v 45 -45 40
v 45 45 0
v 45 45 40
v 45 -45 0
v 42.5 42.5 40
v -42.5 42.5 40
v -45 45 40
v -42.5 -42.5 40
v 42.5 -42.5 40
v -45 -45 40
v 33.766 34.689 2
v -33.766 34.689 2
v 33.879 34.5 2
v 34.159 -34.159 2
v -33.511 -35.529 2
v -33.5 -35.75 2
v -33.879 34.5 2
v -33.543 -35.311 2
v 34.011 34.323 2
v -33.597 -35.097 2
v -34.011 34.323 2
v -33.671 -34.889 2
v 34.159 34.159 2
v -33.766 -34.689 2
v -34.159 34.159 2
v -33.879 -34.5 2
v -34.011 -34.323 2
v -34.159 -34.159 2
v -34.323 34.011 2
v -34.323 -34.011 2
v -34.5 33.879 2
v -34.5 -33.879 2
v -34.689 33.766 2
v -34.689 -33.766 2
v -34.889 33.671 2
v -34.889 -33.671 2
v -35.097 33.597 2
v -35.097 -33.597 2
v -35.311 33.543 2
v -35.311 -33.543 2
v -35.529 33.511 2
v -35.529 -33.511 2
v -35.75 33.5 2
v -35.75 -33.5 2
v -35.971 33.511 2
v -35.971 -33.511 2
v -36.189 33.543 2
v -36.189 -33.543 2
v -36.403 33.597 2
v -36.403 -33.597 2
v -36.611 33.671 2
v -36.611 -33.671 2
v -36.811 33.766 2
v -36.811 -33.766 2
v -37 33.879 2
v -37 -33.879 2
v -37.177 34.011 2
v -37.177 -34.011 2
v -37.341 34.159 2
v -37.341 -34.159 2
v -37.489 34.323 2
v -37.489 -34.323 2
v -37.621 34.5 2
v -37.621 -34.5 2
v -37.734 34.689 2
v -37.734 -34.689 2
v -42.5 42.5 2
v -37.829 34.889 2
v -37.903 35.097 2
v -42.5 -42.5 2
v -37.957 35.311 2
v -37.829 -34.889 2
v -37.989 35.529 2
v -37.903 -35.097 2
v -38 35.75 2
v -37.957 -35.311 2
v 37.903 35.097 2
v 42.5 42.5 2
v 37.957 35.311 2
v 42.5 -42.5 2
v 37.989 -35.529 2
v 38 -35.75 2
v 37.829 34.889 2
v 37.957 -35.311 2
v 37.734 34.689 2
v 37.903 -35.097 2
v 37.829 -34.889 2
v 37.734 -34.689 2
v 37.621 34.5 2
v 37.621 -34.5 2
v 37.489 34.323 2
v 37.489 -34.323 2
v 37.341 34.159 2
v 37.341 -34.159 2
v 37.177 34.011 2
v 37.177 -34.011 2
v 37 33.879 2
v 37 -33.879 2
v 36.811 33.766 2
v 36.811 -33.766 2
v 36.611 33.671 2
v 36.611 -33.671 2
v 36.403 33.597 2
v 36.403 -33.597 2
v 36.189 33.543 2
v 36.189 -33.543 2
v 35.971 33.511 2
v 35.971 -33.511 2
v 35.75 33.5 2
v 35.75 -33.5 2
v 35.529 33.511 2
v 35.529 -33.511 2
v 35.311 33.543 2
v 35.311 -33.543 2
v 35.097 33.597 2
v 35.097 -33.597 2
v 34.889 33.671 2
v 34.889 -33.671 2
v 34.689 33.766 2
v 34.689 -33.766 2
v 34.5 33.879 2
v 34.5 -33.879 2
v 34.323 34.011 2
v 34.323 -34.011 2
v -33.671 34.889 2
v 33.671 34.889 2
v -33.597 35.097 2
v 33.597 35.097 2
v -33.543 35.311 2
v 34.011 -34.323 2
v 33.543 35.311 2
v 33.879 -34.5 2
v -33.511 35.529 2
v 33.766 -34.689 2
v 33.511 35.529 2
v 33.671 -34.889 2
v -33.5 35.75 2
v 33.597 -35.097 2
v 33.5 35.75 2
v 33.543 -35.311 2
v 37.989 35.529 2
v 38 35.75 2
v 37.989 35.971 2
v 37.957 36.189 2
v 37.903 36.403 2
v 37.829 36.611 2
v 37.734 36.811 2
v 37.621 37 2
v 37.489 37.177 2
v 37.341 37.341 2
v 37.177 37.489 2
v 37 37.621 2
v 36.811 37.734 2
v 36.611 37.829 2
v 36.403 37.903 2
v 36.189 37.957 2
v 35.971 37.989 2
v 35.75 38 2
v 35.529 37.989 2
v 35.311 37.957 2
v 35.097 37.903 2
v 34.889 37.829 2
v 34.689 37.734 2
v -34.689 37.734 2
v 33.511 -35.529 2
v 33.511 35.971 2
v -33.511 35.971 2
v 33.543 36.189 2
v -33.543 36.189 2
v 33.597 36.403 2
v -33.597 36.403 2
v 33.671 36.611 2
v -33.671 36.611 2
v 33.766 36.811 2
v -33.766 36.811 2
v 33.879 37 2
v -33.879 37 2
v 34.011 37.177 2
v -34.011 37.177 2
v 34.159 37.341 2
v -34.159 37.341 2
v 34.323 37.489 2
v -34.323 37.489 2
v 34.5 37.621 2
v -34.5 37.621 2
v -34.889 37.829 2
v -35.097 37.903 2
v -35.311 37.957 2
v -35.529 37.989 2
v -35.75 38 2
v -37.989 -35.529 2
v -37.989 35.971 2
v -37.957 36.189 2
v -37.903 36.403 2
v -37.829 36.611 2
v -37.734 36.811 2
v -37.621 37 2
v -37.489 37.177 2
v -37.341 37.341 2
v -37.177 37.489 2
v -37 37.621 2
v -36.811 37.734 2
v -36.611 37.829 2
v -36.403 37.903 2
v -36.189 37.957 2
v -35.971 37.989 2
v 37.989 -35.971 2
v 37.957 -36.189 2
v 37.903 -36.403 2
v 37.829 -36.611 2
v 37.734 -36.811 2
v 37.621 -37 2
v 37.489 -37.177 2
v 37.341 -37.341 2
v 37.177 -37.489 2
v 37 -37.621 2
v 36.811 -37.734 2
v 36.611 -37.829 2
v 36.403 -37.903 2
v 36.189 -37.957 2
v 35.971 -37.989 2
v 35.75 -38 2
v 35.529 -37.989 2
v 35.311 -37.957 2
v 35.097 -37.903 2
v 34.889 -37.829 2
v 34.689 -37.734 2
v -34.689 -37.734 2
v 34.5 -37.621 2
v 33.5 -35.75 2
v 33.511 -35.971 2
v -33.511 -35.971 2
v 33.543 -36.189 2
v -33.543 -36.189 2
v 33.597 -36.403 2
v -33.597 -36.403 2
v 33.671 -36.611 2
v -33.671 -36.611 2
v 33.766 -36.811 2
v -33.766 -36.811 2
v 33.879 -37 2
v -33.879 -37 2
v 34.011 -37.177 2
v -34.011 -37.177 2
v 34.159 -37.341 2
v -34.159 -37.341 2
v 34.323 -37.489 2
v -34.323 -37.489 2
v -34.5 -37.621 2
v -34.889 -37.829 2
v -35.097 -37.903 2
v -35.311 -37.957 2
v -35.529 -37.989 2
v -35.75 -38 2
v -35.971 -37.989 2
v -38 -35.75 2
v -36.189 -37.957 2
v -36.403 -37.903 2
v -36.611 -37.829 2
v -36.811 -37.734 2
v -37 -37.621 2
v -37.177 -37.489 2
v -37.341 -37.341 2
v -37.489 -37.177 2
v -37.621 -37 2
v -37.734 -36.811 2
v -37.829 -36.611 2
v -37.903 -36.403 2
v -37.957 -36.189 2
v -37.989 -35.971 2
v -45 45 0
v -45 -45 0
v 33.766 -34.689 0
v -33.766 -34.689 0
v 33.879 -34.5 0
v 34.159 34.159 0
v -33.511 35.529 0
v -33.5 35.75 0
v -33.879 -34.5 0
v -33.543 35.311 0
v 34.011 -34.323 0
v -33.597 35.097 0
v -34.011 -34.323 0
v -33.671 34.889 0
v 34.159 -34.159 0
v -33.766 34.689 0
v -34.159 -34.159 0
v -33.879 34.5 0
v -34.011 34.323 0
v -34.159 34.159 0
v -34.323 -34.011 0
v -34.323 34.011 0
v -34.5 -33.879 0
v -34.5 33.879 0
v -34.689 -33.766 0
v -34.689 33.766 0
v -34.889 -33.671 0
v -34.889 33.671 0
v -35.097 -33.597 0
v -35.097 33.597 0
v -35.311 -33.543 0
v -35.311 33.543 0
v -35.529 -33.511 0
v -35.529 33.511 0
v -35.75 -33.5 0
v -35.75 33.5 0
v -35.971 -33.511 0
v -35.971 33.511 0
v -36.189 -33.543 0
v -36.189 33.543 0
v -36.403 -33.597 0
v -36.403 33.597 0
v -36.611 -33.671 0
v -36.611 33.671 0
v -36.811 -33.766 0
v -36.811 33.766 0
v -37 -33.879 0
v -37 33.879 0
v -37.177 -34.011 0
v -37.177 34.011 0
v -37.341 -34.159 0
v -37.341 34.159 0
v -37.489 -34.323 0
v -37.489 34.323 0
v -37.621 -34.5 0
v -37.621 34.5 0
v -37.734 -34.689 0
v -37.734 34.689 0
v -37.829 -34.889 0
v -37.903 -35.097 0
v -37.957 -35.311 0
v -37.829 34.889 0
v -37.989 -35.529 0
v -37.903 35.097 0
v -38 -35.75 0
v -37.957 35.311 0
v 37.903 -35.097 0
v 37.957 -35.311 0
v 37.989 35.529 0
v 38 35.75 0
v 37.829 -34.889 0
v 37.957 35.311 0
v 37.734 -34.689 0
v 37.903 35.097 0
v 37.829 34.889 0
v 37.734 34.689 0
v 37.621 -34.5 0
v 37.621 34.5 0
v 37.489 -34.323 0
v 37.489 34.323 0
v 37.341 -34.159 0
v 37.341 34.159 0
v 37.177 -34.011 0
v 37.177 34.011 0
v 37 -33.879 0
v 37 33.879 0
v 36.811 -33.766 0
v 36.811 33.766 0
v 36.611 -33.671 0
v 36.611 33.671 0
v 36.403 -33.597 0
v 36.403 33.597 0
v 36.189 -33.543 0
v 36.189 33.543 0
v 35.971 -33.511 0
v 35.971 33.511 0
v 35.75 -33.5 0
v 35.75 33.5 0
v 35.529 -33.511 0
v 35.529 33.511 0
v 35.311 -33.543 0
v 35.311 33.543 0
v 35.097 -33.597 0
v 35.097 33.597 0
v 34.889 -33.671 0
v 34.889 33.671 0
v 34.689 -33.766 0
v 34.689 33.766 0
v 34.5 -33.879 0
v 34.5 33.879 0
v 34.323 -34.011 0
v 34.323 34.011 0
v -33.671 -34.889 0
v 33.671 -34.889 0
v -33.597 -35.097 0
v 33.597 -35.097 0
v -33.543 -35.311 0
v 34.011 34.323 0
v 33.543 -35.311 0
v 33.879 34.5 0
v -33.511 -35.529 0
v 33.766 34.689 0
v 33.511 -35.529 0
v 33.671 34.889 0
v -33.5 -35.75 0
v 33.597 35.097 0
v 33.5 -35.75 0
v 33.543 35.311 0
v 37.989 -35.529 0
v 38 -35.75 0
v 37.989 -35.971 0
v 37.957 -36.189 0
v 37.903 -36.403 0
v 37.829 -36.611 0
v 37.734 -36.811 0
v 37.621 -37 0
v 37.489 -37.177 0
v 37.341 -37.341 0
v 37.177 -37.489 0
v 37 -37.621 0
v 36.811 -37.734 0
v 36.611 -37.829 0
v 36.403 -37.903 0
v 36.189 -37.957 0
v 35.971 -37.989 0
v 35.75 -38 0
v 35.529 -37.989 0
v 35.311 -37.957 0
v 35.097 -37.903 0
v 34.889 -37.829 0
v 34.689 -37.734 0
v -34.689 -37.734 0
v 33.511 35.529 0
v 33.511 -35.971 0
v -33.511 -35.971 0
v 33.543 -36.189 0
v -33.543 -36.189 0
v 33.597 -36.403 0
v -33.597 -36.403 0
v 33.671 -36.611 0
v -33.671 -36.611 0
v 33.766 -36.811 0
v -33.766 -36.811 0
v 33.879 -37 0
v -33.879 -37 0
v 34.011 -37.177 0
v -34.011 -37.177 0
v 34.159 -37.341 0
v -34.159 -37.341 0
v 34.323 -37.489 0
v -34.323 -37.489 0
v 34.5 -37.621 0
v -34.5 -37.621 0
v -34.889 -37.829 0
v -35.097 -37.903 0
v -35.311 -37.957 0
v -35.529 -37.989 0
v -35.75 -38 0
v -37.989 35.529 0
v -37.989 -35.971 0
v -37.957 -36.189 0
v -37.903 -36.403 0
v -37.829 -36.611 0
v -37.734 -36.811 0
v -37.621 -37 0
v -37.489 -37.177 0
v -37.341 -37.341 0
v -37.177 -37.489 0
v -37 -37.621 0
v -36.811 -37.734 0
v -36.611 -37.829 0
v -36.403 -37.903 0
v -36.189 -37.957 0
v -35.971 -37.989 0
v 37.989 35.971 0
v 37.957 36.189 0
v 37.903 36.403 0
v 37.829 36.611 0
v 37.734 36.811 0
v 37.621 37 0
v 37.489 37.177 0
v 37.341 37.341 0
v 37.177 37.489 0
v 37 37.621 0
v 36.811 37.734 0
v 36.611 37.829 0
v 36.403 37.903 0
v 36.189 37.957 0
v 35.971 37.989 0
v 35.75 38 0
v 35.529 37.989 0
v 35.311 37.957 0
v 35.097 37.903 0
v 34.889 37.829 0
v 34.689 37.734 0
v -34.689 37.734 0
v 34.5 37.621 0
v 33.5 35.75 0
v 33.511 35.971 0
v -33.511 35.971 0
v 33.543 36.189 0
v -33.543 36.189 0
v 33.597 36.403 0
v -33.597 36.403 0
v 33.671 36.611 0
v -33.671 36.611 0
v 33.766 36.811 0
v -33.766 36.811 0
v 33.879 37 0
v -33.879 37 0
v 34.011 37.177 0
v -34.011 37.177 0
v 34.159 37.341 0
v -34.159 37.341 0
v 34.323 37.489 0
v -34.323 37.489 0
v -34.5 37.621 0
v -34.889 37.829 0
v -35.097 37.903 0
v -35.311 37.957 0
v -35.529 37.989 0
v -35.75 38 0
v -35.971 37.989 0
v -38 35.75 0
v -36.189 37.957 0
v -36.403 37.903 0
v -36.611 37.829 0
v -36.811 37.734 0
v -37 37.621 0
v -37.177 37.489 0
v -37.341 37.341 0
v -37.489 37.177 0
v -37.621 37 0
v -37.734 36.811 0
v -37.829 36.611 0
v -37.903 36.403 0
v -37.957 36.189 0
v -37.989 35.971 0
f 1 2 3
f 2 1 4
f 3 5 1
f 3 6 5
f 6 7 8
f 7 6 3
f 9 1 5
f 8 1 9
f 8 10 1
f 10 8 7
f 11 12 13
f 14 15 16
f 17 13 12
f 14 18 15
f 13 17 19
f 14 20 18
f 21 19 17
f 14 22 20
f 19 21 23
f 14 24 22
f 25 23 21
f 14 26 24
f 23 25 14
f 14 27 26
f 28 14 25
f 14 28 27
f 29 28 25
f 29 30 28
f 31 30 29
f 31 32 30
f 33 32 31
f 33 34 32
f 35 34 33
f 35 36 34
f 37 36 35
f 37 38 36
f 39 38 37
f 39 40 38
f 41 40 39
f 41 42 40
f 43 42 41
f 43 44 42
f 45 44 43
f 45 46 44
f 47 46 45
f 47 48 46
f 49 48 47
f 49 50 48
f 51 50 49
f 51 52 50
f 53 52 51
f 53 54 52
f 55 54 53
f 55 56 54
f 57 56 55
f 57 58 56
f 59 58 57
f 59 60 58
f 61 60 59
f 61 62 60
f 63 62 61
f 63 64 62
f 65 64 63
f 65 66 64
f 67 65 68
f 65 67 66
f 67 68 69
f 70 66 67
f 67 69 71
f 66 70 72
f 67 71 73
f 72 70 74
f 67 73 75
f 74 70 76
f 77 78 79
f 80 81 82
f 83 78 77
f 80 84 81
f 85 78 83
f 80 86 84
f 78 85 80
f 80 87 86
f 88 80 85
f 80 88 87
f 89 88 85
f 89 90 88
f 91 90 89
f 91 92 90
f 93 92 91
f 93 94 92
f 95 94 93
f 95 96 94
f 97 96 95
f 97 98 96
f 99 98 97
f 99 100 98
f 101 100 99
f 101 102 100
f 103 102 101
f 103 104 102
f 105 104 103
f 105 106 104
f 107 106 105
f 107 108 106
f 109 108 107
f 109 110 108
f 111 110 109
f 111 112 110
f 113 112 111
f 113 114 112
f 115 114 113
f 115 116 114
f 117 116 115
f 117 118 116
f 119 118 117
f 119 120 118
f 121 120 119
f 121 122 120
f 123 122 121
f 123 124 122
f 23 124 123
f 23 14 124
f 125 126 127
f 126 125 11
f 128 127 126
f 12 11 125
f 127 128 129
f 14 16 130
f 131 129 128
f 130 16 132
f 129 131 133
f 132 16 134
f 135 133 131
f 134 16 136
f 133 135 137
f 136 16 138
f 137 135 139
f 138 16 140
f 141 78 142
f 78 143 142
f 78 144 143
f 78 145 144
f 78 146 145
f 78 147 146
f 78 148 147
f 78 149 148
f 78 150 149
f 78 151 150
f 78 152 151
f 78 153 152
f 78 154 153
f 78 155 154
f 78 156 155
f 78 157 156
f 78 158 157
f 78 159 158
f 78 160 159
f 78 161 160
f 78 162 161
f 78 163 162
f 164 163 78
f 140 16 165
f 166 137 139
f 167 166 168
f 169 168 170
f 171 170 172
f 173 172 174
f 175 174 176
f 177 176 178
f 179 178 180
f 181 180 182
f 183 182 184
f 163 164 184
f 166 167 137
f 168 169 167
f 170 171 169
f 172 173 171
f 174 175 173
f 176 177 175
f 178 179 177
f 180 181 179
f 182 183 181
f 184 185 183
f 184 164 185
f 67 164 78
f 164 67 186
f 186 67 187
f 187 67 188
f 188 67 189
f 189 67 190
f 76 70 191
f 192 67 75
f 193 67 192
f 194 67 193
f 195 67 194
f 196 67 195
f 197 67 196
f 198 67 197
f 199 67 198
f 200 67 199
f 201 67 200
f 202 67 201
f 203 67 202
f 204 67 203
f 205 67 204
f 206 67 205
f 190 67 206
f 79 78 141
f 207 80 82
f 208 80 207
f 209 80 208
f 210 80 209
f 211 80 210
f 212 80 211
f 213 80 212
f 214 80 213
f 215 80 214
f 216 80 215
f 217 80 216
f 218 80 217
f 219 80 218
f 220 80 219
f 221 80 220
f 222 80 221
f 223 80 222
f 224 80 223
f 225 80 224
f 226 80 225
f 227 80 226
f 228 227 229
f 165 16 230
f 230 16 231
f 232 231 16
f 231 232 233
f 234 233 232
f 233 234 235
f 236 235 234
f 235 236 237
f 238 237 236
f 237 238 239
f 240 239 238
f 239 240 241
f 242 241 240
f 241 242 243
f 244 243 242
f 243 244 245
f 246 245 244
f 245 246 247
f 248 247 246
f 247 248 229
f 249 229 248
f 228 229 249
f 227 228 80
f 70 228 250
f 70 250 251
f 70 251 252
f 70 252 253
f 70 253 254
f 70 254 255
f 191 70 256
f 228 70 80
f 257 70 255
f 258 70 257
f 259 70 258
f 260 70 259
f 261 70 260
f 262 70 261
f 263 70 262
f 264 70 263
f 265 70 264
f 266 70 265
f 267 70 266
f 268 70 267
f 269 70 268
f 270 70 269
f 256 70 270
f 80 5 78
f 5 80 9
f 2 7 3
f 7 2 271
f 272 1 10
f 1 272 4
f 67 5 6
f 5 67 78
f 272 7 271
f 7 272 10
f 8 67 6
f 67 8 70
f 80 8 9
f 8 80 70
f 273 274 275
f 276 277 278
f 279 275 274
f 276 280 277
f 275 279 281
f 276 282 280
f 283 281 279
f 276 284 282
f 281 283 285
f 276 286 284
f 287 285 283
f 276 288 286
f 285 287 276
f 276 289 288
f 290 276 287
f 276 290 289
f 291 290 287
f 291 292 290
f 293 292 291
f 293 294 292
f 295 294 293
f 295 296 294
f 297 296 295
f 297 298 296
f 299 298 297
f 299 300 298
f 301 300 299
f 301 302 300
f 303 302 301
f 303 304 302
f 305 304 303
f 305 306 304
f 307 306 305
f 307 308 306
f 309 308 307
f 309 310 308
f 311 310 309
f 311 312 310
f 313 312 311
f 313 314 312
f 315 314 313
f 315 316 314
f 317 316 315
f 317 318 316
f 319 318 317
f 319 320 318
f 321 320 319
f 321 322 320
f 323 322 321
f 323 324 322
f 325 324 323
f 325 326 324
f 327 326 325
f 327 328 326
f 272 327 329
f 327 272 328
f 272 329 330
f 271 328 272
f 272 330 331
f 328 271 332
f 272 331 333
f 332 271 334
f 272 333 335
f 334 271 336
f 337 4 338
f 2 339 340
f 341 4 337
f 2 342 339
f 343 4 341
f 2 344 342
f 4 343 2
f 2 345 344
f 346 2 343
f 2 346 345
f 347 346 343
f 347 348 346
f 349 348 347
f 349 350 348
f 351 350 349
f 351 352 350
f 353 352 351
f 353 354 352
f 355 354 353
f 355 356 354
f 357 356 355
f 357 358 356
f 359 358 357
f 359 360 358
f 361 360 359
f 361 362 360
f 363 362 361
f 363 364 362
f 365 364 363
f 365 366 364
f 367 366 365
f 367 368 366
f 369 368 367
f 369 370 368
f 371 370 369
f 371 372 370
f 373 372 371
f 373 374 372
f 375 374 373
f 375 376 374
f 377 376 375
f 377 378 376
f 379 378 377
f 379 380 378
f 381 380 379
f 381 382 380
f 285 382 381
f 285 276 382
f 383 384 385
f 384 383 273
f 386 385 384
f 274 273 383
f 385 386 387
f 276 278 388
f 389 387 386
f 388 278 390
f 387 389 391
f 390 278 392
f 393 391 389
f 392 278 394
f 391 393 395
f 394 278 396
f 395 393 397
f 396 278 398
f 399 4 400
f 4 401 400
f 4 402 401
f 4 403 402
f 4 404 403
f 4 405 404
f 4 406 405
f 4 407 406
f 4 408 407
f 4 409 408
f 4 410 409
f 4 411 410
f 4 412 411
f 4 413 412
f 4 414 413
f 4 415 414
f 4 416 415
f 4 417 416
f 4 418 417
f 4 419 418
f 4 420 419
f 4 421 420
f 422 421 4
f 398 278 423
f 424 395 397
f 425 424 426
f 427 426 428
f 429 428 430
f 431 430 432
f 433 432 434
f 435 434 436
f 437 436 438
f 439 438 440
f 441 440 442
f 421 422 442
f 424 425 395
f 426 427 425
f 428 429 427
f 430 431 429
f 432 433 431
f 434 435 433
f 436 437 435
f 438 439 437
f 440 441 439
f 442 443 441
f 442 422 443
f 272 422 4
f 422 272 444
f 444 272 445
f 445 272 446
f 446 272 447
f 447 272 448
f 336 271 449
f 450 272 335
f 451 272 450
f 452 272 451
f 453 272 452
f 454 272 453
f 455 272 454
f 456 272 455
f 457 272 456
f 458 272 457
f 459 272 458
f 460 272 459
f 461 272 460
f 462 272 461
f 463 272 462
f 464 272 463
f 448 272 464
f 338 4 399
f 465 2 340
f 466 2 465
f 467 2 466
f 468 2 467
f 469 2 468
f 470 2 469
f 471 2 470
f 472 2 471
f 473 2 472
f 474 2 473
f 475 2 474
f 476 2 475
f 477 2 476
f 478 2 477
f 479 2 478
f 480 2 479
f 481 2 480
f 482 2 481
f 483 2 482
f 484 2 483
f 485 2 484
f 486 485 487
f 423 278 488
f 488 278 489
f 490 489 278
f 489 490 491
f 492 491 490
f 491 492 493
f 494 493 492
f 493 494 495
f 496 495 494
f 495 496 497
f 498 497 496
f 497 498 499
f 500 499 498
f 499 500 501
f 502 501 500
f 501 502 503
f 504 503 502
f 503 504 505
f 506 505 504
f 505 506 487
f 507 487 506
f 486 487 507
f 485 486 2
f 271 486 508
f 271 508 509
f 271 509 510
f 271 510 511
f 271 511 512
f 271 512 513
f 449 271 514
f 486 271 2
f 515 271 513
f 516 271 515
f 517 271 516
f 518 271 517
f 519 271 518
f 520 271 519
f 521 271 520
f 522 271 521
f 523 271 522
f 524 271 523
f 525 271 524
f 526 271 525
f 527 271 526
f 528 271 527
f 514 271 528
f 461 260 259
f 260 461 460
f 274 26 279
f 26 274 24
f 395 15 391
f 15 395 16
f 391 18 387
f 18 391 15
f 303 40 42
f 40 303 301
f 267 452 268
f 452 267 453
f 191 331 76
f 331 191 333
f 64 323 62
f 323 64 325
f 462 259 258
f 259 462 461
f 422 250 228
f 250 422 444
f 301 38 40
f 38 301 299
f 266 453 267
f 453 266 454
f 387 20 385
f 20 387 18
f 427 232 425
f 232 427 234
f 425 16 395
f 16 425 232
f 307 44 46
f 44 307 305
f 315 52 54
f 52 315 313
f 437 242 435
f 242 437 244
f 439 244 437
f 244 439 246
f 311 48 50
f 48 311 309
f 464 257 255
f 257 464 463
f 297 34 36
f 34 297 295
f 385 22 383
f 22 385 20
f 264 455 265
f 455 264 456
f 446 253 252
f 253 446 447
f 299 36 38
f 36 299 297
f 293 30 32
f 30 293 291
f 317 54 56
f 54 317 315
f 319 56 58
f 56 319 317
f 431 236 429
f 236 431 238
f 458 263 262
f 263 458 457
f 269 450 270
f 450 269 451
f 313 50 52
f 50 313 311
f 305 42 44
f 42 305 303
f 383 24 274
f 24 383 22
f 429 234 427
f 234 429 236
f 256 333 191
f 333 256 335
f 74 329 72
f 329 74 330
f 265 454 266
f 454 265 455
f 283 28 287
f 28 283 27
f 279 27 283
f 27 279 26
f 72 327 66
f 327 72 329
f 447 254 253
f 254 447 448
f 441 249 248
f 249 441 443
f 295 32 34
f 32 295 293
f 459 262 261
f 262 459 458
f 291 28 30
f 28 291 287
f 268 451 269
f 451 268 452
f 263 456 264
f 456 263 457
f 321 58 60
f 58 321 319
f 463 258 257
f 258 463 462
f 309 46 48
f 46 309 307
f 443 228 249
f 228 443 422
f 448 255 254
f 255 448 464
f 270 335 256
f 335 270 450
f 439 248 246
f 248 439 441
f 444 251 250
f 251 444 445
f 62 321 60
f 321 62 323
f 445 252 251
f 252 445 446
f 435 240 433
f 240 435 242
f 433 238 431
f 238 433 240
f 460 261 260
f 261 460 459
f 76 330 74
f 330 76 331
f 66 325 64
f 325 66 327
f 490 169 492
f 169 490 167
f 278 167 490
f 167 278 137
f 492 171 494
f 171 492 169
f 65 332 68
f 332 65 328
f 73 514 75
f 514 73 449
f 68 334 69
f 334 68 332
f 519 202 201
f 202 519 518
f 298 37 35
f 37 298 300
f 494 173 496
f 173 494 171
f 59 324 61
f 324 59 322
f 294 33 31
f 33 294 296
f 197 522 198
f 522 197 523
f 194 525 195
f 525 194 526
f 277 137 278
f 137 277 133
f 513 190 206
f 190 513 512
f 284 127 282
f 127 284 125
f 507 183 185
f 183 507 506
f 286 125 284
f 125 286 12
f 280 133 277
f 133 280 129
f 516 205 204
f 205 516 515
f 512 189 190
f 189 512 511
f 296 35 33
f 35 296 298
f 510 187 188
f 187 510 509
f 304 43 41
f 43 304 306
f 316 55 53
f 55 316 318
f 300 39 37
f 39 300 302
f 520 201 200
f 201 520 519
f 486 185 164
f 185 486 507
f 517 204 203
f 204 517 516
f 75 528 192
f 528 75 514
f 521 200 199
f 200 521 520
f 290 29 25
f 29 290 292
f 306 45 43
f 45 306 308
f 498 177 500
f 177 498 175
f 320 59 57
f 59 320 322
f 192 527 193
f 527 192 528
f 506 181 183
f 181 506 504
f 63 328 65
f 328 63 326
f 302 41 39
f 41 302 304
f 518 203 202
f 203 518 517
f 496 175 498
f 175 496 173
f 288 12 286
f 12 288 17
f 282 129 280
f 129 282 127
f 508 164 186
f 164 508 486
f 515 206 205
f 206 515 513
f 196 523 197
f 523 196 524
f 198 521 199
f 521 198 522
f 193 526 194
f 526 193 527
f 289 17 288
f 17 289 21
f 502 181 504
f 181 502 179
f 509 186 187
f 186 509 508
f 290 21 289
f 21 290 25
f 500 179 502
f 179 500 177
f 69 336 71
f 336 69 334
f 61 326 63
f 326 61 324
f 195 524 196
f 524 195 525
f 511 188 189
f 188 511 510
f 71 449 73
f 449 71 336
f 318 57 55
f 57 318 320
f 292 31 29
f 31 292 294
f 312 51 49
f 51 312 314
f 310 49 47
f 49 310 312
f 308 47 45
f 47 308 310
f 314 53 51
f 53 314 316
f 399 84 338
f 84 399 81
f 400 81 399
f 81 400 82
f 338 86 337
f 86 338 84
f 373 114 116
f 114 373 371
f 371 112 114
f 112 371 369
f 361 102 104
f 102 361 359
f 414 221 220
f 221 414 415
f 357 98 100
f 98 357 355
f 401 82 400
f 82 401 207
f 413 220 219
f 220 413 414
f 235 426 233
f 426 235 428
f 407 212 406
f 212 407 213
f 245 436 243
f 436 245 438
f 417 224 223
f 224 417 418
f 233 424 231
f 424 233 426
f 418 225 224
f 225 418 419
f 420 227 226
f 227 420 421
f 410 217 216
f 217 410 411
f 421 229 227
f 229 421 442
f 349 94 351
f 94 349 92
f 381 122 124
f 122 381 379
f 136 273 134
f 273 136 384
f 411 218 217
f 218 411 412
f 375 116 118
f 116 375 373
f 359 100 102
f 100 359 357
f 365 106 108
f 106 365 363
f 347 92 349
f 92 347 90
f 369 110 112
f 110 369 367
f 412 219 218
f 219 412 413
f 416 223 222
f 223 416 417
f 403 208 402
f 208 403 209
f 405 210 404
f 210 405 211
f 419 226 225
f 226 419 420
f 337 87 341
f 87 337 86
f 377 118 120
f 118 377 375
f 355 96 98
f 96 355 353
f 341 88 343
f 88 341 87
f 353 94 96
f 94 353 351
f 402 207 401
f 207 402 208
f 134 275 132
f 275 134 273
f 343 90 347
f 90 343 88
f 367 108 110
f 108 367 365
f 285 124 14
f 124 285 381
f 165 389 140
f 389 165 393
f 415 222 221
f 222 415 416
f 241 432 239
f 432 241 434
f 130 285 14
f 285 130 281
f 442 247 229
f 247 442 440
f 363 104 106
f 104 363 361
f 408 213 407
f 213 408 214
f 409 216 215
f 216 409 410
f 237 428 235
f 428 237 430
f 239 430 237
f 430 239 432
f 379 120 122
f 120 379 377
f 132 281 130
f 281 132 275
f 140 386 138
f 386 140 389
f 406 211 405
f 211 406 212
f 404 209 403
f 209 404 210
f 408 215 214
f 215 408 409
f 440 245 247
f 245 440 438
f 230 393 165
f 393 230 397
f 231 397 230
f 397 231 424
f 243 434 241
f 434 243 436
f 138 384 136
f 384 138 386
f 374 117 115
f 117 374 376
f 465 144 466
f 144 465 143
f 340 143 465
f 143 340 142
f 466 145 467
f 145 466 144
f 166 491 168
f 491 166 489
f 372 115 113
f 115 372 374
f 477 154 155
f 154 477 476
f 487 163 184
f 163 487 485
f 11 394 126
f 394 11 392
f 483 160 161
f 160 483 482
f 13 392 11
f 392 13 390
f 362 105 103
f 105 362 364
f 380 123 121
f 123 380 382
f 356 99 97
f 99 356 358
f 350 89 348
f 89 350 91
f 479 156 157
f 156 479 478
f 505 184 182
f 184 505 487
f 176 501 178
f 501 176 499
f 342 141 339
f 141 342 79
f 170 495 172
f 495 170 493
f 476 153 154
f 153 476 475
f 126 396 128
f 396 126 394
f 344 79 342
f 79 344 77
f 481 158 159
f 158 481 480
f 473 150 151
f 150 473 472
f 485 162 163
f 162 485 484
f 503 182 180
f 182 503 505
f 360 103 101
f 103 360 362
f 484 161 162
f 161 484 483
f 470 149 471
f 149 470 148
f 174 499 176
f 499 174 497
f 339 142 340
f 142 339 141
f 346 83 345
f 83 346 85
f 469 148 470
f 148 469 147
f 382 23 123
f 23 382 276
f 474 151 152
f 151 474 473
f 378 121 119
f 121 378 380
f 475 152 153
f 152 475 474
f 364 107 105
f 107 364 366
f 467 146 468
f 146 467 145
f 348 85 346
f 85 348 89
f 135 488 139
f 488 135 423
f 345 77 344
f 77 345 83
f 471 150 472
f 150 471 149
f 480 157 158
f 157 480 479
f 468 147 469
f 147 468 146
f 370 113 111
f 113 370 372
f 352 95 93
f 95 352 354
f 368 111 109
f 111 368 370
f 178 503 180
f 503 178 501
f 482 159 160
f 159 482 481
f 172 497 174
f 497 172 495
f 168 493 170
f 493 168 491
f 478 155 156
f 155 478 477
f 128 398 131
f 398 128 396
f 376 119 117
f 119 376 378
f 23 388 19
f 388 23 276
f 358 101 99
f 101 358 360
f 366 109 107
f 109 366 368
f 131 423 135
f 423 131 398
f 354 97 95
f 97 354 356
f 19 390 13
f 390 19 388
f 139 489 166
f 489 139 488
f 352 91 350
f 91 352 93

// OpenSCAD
// Magnetic stirrer housing for 80 mm PC case fan
// Print orientation: top plate on bed (z = 0), walls build upward (+Z)

// ---------- Parameters ----------
plate_t      = 2;     // top plate thickness (mm)
wall_t       = 2.5;   // wall thickness (mm)
box_h        = 40;    // total height of box (mm)
outer_x      = 90;    // outer size in X (mm)
outer_y      = 90;    // outer size in Y (mm)
hole_d       = 4.5;   // M4 screw hole diameter (mm)
hole_pitch   = 71.5;  // screw hole square pattern size (mm)
notch_w      = 12;    // cable notch width (mm)
notch_depth  = 8;     // cable notch depth from open edge (mm)
eps          = 0.5;   // cutter overshoot past faces (mm)

$fn = 64;

// ---------- Model ----------
difference() {
    // Outer box body
    union() {
        // Top plate
        translate([-outer_x / 2, -outer_y / 2, 0])
            cube([outer_x, outer_y, plate_t]);

        // Walls (open top)
        for (sides = [0, 90, 180, 270])
            rotate([0, 0, sides])
                translate([outer_x / 2 - wall_t, -outer_y / 2, plate_t])
                    cube([wall_t, outer_y, box_h - plate_t]);
    }

    // Screw holes through top plate, centred on plate
    for (x = [-hole_pitch / 2, hole_pitch / 2])
        for (y = [-hole_pitch / 2, hole_pitch / 2])
            translate([x, y, -eps])
                cylinder(d = hole_d, h = plate_t + 2 * eps);

    // Cable notch in one wall, centred along the wall, near the open edge
    translate([-outer_x / 2, -outer_y / 2, plate_t])
        rotate([90, 0, 0])
            translate([0, -notch_w / 2, box_h - notch_depth])
                cube([notch_w, outer_y / 2 + eps, notch_depth + eps]);
}
